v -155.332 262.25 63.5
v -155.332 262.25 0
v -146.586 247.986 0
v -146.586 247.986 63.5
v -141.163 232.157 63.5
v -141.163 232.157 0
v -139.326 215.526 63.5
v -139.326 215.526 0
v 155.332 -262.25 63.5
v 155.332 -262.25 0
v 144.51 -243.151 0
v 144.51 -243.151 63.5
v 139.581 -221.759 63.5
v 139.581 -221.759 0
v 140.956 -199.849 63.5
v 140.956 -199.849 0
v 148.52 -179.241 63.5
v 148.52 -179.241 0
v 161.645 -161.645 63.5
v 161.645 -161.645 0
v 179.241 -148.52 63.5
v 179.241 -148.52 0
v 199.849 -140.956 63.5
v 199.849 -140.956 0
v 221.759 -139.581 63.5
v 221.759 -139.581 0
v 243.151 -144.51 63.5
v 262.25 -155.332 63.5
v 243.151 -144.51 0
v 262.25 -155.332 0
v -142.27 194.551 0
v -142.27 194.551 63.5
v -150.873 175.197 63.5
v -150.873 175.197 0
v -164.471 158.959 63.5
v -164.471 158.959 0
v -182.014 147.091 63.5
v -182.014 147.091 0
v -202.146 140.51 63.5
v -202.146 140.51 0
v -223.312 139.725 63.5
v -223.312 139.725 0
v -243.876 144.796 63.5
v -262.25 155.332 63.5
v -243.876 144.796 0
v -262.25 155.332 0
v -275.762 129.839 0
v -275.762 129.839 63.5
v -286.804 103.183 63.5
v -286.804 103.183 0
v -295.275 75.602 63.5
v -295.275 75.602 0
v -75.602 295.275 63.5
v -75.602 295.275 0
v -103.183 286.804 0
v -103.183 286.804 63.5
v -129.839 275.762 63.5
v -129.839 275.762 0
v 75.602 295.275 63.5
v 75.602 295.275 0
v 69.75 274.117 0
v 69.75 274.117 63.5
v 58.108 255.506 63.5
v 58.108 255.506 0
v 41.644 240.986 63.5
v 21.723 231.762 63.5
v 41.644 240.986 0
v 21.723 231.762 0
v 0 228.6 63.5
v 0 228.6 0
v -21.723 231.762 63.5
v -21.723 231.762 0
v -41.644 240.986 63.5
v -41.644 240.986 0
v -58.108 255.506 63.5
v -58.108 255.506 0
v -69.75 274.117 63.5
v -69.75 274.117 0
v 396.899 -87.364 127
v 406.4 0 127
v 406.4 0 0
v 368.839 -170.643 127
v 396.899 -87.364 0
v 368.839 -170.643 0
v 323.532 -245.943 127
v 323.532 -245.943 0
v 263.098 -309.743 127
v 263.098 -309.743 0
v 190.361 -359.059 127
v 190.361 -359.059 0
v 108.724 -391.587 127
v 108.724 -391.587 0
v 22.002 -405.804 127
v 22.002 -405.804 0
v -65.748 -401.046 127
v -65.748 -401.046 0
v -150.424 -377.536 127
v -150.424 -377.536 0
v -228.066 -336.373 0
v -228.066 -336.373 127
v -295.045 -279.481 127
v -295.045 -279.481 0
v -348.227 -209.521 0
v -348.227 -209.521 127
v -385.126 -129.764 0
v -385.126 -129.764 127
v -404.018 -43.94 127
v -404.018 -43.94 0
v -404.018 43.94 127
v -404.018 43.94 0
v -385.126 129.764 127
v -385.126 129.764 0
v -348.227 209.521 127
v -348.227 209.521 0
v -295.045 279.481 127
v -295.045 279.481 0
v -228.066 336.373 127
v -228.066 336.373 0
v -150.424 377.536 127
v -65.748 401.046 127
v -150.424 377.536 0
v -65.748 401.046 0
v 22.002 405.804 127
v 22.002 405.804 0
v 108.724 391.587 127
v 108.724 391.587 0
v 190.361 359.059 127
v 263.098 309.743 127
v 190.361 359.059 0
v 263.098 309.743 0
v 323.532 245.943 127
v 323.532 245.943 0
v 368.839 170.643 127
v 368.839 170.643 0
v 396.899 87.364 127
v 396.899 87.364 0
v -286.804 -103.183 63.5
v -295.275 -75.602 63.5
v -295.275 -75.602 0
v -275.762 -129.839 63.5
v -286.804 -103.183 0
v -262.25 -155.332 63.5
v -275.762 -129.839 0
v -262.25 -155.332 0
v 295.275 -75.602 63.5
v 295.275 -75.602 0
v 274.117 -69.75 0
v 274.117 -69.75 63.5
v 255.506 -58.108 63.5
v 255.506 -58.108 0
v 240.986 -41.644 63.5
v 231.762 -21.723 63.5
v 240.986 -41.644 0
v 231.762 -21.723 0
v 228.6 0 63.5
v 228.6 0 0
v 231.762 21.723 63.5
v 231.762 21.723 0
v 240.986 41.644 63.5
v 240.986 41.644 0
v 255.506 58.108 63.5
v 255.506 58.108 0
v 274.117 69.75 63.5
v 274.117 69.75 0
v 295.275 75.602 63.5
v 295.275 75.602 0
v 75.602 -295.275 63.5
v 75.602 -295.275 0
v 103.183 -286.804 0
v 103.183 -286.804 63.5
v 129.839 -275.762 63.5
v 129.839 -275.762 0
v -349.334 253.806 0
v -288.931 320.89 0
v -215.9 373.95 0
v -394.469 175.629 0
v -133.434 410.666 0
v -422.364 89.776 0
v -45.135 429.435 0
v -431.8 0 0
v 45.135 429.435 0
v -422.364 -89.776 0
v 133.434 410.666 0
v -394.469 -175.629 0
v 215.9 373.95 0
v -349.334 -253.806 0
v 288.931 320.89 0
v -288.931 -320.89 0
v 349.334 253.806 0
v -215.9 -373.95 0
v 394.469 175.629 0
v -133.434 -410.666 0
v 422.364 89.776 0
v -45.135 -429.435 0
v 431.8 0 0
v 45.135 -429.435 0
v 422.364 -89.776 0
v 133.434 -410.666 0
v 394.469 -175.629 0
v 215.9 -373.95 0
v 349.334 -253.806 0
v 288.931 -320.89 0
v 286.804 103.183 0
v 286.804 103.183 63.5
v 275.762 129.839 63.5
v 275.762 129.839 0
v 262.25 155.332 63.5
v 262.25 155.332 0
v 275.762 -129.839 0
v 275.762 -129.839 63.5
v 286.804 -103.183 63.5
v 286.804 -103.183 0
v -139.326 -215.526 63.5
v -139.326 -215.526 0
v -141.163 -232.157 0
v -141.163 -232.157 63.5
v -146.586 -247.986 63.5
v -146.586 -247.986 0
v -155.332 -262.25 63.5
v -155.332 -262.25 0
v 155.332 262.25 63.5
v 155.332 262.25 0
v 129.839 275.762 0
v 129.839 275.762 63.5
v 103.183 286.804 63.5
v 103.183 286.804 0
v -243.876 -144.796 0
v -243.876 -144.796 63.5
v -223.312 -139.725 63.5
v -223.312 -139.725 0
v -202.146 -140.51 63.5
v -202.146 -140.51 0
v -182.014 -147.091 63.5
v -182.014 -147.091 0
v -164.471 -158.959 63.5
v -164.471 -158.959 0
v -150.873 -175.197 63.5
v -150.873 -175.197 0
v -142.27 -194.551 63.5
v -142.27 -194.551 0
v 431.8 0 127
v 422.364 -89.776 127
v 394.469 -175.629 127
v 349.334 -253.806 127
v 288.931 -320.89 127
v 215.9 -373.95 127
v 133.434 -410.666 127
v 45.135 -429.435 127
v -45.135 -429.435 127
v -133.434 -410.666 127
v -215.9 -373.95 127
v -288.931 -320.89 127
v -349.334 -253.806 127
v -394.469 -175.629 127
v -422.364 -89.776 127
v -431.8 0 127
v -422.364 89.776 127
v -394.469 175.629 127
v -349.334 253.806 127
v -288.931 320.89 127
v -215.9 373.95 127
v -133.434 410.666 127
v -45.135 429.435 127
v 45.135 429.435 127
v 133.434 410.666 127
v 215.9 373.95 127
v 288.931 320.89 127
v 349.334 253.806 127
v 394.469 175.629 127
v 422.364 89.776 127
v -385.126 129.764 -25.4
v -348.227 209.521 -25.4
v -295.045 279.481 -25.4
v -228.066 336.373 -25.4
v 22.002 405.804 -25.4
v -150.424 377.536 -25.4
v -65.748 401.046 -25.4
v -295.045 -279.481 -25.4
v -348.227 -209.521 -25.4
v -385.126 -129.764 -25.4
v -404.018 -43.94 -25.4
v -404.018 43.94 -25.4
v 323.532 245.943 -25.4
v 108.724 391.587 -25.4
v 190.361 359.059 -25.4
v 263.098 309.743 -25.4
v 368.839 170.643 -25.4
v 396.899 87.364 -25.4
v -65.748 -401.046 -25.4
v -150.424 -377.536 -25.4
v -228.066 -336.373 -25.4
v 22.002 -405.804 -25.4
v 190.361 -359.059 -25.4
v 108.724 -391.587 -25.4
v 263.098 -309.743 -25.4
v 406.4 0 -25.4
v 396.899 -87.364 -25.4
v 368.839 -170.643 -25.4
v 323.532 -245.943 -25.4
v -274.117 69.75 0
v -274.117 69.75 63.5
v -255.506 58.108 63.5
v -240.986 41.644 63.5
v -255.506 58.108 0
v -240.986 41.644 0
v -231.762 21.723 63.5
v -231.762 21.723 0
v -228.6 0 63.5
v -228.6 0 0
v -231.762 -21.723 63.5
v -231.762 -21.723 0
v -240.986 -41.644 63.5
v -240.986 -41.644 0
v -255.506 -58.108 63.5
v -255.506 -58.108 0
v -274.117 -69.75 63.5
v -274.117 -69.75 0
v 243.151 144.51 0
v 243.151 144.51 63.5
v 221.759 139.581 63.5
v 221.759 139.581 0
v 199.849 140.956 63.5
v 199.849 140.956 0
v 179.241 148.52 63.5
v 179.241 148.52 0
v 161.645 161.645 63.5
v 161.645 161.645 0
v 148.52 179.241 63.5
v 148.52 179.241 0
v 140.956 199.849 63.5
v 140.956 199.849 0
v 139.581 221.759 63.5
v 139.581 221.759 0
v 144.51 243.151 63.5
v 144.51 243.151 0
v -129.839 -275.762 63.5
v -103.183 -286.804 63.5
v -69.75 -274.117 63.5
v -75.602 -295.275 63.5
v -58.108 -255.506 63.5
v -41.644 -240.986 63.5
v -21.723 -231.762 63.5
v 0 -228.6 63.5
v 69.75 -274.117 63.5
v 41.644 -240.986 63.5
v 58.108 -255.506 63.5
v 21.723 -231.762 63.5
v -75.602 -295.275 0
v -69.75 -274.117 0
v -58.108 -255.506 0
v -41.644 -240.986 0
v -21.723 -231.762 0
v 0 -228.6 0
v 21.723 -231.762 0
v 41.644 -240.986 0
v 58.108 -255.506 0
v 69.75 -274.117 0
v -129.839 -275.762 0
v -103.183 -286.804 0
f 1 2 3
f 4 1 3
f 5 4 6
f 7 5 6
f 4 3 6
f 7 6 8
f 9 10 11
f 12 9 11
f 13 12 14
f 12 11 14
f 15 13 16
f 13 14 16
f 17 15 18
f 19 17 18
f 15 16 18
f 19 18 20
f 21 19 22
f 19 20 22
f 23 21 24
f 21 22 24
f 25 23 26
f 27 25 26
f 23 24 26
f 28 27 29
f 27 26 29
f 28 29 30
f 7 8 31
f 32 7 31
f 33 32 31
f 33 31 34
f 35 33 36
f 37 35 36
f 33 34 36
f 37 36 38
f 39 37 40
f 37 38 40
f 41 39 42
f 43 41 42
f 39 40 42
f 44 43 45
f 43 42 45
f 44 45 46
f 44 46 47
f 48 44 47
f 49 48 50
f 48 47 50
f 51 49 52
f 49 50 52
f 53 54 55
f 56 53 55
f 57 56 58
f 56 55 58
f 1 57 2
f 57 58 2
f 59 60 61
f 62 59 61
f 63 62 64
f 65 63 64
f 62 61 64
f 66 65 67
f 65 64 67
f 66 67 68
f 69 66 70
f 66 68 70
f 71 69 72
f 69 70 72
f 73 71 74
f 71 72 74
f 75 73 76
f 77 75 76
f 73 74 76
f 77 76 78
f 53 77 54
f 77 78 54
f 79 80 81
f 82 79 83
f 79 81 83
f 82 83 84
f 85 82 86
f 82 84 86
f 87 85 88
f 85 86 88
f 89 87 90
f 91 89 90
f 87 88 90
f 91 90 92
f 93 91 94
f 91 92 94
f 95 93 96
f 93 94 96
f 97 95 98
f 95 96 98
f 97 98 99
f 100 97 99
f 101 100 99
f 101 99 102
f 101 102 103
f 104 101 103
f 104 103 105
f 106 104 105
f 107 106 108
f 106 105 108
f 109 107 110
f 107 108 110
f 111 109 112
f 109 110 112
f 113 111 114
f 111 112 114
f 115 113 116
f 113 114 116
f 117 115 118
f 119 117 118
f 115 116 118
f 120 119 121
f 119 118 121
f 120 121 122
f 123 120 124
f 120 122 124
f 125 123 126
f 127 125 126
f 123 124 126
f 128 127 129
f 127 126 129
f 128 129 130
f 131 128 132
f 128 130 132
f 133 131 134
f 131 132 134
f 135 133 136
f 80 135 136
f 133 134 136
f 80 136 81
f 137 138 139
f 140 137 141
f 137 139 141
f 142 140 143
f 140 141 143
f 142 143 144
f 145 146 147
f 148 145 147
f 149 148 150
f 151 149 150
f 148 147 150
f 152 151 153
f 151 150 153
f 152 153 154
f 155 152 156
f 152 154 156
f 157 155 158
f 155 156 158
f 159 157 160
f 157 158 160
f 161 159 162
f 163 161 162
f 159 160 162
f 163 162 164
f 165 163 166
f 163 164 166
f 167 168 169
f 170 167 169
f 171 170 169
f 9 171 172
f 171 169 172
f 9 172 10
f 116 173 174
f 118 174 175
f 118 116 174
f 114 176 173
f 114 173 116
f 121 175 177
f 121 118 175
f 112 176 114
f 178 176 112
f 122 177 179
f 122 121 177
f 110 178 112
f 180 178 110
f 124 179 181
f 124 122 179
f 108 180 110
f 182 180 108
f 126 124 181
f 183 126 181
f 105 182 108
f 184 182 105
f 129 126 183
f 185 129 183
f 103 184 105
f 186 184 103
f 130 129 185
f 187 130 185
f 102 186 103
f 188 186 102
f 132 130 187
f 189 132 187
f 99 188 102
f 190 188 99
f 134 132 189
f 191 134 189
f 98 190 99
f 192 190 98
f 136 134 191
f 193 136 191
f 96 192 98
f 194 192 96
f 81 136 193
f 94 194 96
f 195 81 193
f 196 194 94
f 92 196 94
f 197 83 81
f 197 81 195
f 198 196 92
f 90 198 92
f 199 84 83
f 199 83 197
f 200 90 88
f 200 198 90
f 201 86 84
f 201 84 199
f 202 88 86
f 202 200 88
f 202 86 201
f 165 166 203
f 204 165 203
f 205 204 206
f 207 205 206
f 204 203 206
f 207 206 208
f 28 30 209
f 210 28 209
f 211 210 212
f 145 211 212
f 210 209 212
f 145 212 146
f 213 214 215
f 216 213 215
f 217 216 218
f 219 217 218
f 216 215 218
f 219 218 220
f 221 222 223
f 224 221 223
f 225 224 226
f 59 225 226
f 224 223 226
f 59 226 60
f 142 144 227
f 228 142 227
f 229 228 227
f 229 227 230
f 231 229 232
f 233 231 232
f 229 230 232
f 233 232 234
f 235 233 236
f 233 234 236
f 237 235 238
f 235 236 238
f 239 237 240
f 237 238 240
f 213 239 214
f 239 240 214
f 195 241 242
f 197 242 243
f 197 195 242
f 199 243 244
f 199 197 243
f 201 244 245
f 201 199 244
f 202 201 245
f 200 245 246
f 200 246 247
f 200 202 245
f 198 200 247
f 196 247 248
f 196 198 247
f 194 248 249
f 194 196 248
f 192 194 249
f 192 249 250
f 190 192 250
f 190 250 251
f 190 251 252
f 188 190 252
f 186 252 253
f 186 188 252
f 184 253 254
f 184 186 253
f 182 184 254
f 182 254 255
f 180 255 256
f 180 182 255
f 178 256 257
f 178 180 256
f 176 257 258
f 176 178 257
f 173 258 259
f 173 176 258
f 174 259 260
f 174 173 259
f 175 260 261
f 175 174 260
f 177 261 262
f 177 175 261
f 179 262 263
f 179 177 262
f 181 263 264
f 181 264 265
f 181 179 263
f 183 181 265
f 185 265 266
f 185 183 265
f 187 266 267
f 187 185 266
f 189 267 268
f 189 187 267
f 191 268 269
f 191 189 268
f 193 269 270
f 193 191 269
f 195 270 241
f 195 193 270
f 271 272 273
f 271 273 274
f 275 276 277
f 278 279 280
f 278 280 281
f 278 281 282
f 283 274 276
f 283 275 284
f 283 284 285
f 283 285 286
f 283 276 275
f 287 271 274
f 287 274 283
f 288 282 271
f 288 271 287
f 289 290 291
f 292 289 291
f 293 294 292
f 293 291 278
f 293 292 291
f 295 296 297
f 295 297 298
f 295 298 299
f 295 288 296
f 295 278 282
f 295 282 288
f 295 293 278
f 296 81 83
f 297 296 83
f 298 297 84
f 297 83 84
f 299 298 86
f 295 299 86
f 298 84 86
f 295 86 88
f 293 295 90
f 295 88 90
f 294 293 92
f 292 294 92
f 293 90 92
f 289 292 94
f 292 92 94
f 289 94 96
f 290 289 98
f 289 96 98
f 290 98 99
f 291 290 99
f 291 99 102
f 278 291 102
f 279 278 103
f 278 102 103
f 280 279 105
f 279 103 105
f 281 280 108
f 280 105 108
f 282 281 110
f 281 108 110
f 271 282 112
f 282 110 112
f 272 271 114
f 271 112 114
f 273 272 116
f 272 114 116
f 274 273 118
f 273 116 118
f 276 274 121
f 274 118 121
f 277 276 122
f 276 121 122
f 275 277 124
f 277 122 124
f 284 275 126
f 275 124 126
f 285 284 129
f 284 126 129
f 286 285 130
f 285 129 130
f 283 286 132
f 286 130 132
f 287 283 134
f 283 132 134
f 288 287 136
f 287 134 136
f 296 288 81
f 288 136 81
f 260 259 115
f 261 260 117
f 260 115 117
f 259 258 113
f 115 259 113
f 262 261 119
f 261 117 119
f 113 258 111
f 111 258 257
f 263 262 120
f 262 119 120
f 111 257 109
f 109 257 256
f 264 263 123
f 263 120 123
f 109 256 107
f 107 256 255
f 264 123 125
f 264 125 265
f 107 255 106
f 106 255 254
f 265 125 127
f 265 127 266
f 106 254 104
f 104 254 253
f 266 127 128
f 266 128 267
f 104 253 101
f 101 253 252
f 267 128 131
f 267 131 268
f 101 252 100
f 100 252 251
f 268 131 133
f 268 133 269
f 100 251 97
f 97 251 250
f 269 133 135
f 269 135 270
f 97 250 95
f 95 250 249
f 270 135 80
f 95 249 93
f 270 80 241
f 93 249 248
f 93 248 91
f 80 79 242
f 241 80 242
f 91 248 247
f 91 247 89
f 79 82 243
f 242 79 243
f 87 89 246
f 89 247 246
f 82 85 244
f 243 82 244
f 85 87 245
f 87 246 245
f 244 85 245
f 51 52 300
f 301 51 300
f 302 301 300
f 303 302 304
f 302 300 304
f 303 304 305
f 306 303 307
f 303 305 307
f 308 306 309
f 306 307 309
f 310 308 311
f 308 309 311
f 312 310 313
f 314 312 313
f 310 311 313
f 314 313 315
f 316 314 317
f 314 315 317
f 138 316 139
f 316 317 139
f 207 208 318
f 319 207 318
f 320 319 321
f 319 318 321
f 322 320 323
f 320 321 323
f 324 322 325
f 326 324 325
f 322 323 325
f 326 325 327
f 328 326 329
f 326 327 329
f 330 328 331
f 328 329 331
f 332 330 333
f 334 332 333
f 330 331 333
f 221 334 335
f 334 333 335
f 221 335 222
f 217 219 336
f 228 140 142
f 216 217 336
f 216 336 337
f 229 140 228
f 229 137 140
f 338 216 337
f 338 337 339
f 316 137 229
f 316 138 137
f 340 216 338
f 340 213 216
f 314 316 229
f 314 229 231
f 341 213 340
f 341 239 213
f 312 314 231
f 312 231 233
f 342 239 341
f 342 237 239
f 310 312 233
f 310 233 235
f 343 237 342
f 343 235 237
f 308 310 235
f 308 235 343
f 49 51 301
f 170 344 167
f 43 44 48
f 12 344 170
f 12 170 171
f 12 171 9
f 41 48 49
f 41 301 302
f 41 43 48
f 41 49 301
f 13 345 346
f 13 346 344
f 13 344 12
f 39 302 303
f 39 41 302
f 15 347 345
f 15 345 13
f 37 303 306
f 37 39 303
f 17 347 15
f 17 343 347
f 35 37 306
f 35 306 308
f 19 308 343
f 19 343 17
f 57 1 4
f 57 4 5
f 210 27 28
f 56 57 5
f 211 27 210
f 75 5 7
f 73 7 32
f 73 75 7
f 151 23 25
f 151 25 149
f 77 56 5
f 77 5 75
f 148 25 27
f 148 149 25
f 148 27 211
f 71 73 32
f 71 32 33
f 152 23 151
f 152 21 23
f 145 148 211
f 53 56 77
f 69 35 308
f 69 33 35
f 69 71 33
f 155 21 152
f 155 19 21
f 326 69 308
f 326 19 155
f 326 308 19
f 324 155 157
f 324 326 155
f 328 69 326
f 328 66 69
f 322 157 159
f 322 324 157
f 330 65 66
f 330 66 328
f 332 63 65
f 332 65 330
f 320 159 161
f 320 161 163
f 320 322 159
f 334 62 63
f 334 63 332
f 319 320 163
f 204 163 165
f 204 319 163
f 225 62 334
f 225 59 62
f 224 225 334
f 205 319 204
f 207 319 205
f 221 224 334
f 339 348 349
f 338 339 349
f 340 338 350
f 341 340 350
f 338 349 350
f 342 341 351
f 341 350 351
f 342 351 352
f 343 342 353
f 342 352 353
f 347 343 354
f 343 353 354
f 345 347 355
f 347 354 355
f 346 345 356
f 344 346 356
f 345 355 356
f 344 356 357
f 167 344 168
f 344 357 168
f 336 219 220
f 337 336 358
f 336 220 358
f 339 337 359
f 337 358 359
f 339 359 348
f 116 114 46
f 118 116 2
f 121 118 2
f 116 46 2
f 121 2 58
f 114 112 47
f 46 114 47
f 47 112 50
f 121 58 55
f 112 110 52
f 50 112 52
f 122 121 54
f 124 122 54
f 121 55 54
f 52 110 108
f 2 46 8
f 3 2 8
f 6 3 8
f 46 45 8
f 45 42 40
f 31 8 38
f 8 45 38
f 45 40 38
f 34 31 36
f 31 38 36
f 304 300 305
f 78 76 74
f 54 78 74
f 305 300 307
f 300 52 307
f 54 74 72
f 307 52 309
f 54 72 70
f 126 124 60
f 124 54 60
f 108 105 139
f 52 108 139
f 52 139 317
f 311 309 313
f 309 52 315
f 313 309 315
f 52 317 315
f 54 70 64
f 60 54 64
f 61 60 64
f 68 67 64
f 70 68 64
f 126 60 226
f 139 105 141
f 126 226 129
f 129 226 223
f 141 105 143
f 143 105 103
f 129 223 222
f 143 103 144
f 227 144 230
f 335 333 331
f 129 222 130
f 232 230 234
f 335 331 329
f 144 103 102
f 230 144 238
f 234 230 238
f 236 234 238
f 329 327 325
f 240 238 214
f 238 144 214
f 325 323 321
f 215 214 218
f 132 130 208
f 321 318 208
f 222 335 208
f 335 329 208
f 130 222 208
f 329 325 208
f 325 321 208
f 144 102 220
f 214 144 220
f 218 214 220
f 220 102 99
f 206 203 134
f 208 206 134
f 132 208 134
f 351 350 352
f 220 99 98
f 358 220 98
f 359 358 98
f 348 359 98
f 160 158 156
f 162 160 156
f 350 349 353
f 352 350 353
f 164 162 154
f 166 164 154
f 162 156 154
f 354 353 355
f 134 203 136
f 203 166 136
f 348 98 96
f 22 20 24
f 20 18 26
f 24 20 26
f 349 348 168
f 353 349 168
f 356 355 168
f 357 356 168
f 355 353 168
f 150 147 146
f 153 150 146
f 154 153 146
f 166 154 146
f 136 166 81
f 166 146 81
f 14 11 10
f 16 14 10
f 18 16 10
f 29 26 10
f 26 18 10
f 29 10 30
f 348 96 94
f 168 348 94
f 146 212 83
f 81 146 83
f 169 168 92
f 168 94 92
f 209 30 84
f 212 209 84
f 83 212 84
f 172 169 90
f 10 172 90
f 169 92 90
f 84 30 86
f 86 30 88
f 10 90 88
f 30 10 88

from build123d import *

# Parameters (mm, degrees)
F0_R     = 304.8
F1_DEPTH = 63.5
F3_DEPTH = 480.06
F5_R     = 406.4
F6_DEPTH = 25.4
F5_R_2   = 431.8
F7_DEPTH = 127


with BuildPart() as f1:
    # F0 (on Top) → F1 (new body)
    with BuildSketch(Plane.XY):
        Circle(F0_R)
    extrude(amount=F1_DEPTH)

    # F2 (on face) → F3 (cut)
    with BuildSketch(Plane(origin=(0, 0, 0), x_dir=(1, 0, 0), z_dir=(0, 0, -1))):
        with BuildLine():
            ThreePointArc((75.6023437137, 295.275), (0, 304.8), (-75.6023437137, 295.275))
            ThreePointArc((-75.6023437137, 295.275), (0, 228.6), (75.6023437137, 295.275))
        make_face()
        with BuildLine():
            ThreePointArc((-139.3261469057, 215.5261469057), (-143.4385886978, 240.220760724), (-155.3320249013, 262.2498847284))
            ThreePointArc((-155.3320249013, 262.2498847284), (-215.5261469057, 215.5261469057), (-262.2498847284, 155.3320249013))
            ThreePointArc((-262.2498847284, 155.3320249013), (-182.0142745474, 147.090816768), (-139.3261469057, 215.5261469057))
        make_face()
        with BuildLine():
            ThreePointArc((-228.6, 0), (-247.65, 50.4015624758), (-295.275, 75.6023437137))
            ThreePointArc((-295.275, 75.6023437137), (-304.8, 0), (-295.275, -75.6023437137))
            ThreePointArc((-295.275, -75.6023437137), (-247.65, -50.4015624758), (-228.6, 0))
        make_face()
        with BuildLine():
            ThreePointArc((-139.3261469057, -215.5261469057), (-182.0142745474, -147.090816768), (-262.2498847284, -155.3320249013))
            ThreePointArc((-262.2498847284, -155.3320249013), (-215.5261469057, -215.5261469057), (-155.3320249013, -262.2498847284))
            ThreePointArc((-155.3320249013, -262.2498847284), (-143.4385886978, -240.220760724), (-139.3261469057, -215.5261469057))
        make_face()
        with BuildLine():
            ThreePointArc((75.6023437137, -295.275), (0, -228.6), (-75.6023437137, -295.275))
            ThreePointArc((-75.6023437137, -295.275), (0, -304.8), (75.6023437137, -295.275))
        make_face()
        with BuildLine():
            ThreePointArc((155.3320249013, -262.2498847284), (215.5261469057, -215.5261469057), (262.2498847284, -155.3320249013))
            ThreePointArc((262.2498847284, -155.3320249013), (161.6446101792, -161.6446101792), (155.3320249013, -262.2498847284))
        make_face()
        with BuildLine():
            ThreePointArc((304.8, 0), (302.4093748547, 38.1), (295.275, 75.6023437137))
            ThreePointArc((295.275, 75.6023437137), (228.6, 0), (295.275, -75.6023437137))
            ThreePointArc((295.275, -75.6023437137), (302.4093748547, -38.1), (304.8, 0))
        make_face()
        with BuildLine():
            ThreePointArc((262.2498847284, 155.3320249013), (215.5261469057, 215.5261469057), (155.3320249013, 262.2498847284))
            ThreePointArc((155.3320249013, 262.2498847284), (161.6446101792, 161.6446101792), (262.2498847284, 155.3320249013))
        make_face()
    extrude(amount=-F3_DEPTH, mode=Mode.SUBTRACT)

    # F5 (on face) → F6 (join)
    with BuildSketch(Plane(origin=(0, 0, 0), x_dir=(1, 0, 0), z_dir=(0, 0, -1))):
        Circle(F5_R)
        with BuildLine():
            ThreePointArc((262.2498847284, 155.3320249013), (281.5984815094, 116.6419101849), (295.275, 75.6023437137))
            ThreePointArc((295.275, 75.6023437137), (228.6, 0), (295.275, -75.6023437137))
            ThreePointArc((295.275, -75.6023437137), (281.5984815094, -116.6419101849), (262.2498847284, -155.3320249013))
            ThreePointArc((262.2498847284, -155.3320249013), (161.6446101792, -161.6446101792), (155.3320249013, -262.2498847284))
            ThreePointArc((155.3320249013, -262.2498847284), (116.6419101849, -281.5984815094), (75.6023437137, -295.275))
            ThreePointArc((75.6023437137, -295.275), (0, -228.6), (-75.6023437137, -295.275))
            ThreePointArc((-75.6023437137, -295.275), (-116.6419101849, -281.5984815094), (-155.3320249013, -262.2498847284))
            ThreePointArc((-155.3320249013, -262.2498847284), (-161.6446101792, -161.6446101792), (-262.2498847284, -155.3320249013))
            ThreePointArc((-262.2498847284, -155.3320249013), (-281.5984815094, -116.6419101849), (-295.275, -75.6023437137))
            ThreePointArc((-295.275, -75.6023437137), (-228.6, 0), (-295.275, 75.6023437137))
            ThreePointArc((-295.275, 75.6023437137), (-281.5984815094, 116.6419101849), (-262.2498847284, 155.3320249013))
            ThreePointArc((-262.2498847284, 155.3320249013), (-161.6446101792, 161.6446101792), (-155.3320249013, 262.2498847284))
            ThreePointArc((-155.3320249013, 262.2498847284), (-116.6419101849, 281.5984815094), (-75.6023437137, 295.275))
            ThreePointArc((-75.6023437137, 295.275), (0, 228.6), (75.6023437137, 295.275))
            ThreePointArc((75.6023437137, 295.275), (116.6419101849, 281.5984815094), (155.3320249013, 262.2498847284))
            ThreePointArc((155.3320249013, 262.2498847284), (161.6446101792, 161.6446101792), (262.2498847284, 155.3320249013))
        make_face(mode=Mode.SUBTRACT)
        with BuildLine():
            ThreePointArc((295.275, -75.6023437137), (228.6, 0), (295.275, 75.6023437137))
            ThreePointArc((295.275, 75.6023437137), (281.5984815094, 116.6419101849), (262.2498847284, 155.3320249013))
            ThreePointArc((262.2498847284, 155.3320249013), (161.6446101792, 161.6446101792), (155.3320249013, 262.2498847284))
            ThreePointArc((155.3320249013, 262.2498847284), (116.6419101849, 281.5984815094), (75.6023437137, 295.275))
            ThreePointArc((75.6023437137, 295.275), (0, 228.6), (-75.6023437137, 295.275))
            ThreePointArc((-75.6023437137, 295.275), (-116.6419101849, 281.5984815094), (-155.3320249013, 262.2498847284))
            ThreePointArc((-155.3320249013, 262.2498847284), (-161.6446101792, 161.6446101792), (-262.2498847284, 155.3320249013))
            ThreePointArc((-262.2498847284, 155.3320249013), (-281.5984815094, 116.6419101849), (-295.275, 75.6023437137))
            ThreePointArc((-295.275, 75.6023437137), (-228.6, 0), (-295.275, -75.6023437137))
            ThreePointArc((-295.275, -75.6023437137), (-281.5984815094, -116.6419101849), (-262.2498847284, -155.3320249013))
            ThreePointArc((-262.2498847284, -155.3320249013), (-161.6446101792, -161.6446101792), (-155.3320249013, -262.2498847284))
            ThreePointArc((-155.3320249013, -262.2498847284), (-116.6419101849, -281.5984815094), (-75.6023437137, -295.275))
            ThreePointArc((-75.6023437137, -295.275), (0, -228.6), (75.6023437137, -295.275))
            ThreePointArc((75.6023437137, -295.275), (116.6419101849, -281.5984815094), (155.3320249013, -262.2498847284))
            ThreePointArc((155.3320249013, -262.2498847284), (161.6446101792, -161.6446101792), (262.2498847284, -155.3320249013))
            ThreePointArc((262.2498847284, -155.3320249013), (281.5984815094, -116.6419101849), (295.275, -75.6023437137))
        make_face()
    extrude(amount=F6_DEPTH)


with BuildPart() as f7:
    # F5 (on face) → F7 (new body)
    with BuildSketch(Plane(origin=(0, 0, 0), x_dir=(1, 0, 0), z_dir=(0, 0, -1))):
        Circle(F5_R_2)
        Circle(F5_R, mode=Mode.SUBTRACT)
    extrude(amount=-F7_DEPTH)


solid = Compound([f1.part, f7.part])
